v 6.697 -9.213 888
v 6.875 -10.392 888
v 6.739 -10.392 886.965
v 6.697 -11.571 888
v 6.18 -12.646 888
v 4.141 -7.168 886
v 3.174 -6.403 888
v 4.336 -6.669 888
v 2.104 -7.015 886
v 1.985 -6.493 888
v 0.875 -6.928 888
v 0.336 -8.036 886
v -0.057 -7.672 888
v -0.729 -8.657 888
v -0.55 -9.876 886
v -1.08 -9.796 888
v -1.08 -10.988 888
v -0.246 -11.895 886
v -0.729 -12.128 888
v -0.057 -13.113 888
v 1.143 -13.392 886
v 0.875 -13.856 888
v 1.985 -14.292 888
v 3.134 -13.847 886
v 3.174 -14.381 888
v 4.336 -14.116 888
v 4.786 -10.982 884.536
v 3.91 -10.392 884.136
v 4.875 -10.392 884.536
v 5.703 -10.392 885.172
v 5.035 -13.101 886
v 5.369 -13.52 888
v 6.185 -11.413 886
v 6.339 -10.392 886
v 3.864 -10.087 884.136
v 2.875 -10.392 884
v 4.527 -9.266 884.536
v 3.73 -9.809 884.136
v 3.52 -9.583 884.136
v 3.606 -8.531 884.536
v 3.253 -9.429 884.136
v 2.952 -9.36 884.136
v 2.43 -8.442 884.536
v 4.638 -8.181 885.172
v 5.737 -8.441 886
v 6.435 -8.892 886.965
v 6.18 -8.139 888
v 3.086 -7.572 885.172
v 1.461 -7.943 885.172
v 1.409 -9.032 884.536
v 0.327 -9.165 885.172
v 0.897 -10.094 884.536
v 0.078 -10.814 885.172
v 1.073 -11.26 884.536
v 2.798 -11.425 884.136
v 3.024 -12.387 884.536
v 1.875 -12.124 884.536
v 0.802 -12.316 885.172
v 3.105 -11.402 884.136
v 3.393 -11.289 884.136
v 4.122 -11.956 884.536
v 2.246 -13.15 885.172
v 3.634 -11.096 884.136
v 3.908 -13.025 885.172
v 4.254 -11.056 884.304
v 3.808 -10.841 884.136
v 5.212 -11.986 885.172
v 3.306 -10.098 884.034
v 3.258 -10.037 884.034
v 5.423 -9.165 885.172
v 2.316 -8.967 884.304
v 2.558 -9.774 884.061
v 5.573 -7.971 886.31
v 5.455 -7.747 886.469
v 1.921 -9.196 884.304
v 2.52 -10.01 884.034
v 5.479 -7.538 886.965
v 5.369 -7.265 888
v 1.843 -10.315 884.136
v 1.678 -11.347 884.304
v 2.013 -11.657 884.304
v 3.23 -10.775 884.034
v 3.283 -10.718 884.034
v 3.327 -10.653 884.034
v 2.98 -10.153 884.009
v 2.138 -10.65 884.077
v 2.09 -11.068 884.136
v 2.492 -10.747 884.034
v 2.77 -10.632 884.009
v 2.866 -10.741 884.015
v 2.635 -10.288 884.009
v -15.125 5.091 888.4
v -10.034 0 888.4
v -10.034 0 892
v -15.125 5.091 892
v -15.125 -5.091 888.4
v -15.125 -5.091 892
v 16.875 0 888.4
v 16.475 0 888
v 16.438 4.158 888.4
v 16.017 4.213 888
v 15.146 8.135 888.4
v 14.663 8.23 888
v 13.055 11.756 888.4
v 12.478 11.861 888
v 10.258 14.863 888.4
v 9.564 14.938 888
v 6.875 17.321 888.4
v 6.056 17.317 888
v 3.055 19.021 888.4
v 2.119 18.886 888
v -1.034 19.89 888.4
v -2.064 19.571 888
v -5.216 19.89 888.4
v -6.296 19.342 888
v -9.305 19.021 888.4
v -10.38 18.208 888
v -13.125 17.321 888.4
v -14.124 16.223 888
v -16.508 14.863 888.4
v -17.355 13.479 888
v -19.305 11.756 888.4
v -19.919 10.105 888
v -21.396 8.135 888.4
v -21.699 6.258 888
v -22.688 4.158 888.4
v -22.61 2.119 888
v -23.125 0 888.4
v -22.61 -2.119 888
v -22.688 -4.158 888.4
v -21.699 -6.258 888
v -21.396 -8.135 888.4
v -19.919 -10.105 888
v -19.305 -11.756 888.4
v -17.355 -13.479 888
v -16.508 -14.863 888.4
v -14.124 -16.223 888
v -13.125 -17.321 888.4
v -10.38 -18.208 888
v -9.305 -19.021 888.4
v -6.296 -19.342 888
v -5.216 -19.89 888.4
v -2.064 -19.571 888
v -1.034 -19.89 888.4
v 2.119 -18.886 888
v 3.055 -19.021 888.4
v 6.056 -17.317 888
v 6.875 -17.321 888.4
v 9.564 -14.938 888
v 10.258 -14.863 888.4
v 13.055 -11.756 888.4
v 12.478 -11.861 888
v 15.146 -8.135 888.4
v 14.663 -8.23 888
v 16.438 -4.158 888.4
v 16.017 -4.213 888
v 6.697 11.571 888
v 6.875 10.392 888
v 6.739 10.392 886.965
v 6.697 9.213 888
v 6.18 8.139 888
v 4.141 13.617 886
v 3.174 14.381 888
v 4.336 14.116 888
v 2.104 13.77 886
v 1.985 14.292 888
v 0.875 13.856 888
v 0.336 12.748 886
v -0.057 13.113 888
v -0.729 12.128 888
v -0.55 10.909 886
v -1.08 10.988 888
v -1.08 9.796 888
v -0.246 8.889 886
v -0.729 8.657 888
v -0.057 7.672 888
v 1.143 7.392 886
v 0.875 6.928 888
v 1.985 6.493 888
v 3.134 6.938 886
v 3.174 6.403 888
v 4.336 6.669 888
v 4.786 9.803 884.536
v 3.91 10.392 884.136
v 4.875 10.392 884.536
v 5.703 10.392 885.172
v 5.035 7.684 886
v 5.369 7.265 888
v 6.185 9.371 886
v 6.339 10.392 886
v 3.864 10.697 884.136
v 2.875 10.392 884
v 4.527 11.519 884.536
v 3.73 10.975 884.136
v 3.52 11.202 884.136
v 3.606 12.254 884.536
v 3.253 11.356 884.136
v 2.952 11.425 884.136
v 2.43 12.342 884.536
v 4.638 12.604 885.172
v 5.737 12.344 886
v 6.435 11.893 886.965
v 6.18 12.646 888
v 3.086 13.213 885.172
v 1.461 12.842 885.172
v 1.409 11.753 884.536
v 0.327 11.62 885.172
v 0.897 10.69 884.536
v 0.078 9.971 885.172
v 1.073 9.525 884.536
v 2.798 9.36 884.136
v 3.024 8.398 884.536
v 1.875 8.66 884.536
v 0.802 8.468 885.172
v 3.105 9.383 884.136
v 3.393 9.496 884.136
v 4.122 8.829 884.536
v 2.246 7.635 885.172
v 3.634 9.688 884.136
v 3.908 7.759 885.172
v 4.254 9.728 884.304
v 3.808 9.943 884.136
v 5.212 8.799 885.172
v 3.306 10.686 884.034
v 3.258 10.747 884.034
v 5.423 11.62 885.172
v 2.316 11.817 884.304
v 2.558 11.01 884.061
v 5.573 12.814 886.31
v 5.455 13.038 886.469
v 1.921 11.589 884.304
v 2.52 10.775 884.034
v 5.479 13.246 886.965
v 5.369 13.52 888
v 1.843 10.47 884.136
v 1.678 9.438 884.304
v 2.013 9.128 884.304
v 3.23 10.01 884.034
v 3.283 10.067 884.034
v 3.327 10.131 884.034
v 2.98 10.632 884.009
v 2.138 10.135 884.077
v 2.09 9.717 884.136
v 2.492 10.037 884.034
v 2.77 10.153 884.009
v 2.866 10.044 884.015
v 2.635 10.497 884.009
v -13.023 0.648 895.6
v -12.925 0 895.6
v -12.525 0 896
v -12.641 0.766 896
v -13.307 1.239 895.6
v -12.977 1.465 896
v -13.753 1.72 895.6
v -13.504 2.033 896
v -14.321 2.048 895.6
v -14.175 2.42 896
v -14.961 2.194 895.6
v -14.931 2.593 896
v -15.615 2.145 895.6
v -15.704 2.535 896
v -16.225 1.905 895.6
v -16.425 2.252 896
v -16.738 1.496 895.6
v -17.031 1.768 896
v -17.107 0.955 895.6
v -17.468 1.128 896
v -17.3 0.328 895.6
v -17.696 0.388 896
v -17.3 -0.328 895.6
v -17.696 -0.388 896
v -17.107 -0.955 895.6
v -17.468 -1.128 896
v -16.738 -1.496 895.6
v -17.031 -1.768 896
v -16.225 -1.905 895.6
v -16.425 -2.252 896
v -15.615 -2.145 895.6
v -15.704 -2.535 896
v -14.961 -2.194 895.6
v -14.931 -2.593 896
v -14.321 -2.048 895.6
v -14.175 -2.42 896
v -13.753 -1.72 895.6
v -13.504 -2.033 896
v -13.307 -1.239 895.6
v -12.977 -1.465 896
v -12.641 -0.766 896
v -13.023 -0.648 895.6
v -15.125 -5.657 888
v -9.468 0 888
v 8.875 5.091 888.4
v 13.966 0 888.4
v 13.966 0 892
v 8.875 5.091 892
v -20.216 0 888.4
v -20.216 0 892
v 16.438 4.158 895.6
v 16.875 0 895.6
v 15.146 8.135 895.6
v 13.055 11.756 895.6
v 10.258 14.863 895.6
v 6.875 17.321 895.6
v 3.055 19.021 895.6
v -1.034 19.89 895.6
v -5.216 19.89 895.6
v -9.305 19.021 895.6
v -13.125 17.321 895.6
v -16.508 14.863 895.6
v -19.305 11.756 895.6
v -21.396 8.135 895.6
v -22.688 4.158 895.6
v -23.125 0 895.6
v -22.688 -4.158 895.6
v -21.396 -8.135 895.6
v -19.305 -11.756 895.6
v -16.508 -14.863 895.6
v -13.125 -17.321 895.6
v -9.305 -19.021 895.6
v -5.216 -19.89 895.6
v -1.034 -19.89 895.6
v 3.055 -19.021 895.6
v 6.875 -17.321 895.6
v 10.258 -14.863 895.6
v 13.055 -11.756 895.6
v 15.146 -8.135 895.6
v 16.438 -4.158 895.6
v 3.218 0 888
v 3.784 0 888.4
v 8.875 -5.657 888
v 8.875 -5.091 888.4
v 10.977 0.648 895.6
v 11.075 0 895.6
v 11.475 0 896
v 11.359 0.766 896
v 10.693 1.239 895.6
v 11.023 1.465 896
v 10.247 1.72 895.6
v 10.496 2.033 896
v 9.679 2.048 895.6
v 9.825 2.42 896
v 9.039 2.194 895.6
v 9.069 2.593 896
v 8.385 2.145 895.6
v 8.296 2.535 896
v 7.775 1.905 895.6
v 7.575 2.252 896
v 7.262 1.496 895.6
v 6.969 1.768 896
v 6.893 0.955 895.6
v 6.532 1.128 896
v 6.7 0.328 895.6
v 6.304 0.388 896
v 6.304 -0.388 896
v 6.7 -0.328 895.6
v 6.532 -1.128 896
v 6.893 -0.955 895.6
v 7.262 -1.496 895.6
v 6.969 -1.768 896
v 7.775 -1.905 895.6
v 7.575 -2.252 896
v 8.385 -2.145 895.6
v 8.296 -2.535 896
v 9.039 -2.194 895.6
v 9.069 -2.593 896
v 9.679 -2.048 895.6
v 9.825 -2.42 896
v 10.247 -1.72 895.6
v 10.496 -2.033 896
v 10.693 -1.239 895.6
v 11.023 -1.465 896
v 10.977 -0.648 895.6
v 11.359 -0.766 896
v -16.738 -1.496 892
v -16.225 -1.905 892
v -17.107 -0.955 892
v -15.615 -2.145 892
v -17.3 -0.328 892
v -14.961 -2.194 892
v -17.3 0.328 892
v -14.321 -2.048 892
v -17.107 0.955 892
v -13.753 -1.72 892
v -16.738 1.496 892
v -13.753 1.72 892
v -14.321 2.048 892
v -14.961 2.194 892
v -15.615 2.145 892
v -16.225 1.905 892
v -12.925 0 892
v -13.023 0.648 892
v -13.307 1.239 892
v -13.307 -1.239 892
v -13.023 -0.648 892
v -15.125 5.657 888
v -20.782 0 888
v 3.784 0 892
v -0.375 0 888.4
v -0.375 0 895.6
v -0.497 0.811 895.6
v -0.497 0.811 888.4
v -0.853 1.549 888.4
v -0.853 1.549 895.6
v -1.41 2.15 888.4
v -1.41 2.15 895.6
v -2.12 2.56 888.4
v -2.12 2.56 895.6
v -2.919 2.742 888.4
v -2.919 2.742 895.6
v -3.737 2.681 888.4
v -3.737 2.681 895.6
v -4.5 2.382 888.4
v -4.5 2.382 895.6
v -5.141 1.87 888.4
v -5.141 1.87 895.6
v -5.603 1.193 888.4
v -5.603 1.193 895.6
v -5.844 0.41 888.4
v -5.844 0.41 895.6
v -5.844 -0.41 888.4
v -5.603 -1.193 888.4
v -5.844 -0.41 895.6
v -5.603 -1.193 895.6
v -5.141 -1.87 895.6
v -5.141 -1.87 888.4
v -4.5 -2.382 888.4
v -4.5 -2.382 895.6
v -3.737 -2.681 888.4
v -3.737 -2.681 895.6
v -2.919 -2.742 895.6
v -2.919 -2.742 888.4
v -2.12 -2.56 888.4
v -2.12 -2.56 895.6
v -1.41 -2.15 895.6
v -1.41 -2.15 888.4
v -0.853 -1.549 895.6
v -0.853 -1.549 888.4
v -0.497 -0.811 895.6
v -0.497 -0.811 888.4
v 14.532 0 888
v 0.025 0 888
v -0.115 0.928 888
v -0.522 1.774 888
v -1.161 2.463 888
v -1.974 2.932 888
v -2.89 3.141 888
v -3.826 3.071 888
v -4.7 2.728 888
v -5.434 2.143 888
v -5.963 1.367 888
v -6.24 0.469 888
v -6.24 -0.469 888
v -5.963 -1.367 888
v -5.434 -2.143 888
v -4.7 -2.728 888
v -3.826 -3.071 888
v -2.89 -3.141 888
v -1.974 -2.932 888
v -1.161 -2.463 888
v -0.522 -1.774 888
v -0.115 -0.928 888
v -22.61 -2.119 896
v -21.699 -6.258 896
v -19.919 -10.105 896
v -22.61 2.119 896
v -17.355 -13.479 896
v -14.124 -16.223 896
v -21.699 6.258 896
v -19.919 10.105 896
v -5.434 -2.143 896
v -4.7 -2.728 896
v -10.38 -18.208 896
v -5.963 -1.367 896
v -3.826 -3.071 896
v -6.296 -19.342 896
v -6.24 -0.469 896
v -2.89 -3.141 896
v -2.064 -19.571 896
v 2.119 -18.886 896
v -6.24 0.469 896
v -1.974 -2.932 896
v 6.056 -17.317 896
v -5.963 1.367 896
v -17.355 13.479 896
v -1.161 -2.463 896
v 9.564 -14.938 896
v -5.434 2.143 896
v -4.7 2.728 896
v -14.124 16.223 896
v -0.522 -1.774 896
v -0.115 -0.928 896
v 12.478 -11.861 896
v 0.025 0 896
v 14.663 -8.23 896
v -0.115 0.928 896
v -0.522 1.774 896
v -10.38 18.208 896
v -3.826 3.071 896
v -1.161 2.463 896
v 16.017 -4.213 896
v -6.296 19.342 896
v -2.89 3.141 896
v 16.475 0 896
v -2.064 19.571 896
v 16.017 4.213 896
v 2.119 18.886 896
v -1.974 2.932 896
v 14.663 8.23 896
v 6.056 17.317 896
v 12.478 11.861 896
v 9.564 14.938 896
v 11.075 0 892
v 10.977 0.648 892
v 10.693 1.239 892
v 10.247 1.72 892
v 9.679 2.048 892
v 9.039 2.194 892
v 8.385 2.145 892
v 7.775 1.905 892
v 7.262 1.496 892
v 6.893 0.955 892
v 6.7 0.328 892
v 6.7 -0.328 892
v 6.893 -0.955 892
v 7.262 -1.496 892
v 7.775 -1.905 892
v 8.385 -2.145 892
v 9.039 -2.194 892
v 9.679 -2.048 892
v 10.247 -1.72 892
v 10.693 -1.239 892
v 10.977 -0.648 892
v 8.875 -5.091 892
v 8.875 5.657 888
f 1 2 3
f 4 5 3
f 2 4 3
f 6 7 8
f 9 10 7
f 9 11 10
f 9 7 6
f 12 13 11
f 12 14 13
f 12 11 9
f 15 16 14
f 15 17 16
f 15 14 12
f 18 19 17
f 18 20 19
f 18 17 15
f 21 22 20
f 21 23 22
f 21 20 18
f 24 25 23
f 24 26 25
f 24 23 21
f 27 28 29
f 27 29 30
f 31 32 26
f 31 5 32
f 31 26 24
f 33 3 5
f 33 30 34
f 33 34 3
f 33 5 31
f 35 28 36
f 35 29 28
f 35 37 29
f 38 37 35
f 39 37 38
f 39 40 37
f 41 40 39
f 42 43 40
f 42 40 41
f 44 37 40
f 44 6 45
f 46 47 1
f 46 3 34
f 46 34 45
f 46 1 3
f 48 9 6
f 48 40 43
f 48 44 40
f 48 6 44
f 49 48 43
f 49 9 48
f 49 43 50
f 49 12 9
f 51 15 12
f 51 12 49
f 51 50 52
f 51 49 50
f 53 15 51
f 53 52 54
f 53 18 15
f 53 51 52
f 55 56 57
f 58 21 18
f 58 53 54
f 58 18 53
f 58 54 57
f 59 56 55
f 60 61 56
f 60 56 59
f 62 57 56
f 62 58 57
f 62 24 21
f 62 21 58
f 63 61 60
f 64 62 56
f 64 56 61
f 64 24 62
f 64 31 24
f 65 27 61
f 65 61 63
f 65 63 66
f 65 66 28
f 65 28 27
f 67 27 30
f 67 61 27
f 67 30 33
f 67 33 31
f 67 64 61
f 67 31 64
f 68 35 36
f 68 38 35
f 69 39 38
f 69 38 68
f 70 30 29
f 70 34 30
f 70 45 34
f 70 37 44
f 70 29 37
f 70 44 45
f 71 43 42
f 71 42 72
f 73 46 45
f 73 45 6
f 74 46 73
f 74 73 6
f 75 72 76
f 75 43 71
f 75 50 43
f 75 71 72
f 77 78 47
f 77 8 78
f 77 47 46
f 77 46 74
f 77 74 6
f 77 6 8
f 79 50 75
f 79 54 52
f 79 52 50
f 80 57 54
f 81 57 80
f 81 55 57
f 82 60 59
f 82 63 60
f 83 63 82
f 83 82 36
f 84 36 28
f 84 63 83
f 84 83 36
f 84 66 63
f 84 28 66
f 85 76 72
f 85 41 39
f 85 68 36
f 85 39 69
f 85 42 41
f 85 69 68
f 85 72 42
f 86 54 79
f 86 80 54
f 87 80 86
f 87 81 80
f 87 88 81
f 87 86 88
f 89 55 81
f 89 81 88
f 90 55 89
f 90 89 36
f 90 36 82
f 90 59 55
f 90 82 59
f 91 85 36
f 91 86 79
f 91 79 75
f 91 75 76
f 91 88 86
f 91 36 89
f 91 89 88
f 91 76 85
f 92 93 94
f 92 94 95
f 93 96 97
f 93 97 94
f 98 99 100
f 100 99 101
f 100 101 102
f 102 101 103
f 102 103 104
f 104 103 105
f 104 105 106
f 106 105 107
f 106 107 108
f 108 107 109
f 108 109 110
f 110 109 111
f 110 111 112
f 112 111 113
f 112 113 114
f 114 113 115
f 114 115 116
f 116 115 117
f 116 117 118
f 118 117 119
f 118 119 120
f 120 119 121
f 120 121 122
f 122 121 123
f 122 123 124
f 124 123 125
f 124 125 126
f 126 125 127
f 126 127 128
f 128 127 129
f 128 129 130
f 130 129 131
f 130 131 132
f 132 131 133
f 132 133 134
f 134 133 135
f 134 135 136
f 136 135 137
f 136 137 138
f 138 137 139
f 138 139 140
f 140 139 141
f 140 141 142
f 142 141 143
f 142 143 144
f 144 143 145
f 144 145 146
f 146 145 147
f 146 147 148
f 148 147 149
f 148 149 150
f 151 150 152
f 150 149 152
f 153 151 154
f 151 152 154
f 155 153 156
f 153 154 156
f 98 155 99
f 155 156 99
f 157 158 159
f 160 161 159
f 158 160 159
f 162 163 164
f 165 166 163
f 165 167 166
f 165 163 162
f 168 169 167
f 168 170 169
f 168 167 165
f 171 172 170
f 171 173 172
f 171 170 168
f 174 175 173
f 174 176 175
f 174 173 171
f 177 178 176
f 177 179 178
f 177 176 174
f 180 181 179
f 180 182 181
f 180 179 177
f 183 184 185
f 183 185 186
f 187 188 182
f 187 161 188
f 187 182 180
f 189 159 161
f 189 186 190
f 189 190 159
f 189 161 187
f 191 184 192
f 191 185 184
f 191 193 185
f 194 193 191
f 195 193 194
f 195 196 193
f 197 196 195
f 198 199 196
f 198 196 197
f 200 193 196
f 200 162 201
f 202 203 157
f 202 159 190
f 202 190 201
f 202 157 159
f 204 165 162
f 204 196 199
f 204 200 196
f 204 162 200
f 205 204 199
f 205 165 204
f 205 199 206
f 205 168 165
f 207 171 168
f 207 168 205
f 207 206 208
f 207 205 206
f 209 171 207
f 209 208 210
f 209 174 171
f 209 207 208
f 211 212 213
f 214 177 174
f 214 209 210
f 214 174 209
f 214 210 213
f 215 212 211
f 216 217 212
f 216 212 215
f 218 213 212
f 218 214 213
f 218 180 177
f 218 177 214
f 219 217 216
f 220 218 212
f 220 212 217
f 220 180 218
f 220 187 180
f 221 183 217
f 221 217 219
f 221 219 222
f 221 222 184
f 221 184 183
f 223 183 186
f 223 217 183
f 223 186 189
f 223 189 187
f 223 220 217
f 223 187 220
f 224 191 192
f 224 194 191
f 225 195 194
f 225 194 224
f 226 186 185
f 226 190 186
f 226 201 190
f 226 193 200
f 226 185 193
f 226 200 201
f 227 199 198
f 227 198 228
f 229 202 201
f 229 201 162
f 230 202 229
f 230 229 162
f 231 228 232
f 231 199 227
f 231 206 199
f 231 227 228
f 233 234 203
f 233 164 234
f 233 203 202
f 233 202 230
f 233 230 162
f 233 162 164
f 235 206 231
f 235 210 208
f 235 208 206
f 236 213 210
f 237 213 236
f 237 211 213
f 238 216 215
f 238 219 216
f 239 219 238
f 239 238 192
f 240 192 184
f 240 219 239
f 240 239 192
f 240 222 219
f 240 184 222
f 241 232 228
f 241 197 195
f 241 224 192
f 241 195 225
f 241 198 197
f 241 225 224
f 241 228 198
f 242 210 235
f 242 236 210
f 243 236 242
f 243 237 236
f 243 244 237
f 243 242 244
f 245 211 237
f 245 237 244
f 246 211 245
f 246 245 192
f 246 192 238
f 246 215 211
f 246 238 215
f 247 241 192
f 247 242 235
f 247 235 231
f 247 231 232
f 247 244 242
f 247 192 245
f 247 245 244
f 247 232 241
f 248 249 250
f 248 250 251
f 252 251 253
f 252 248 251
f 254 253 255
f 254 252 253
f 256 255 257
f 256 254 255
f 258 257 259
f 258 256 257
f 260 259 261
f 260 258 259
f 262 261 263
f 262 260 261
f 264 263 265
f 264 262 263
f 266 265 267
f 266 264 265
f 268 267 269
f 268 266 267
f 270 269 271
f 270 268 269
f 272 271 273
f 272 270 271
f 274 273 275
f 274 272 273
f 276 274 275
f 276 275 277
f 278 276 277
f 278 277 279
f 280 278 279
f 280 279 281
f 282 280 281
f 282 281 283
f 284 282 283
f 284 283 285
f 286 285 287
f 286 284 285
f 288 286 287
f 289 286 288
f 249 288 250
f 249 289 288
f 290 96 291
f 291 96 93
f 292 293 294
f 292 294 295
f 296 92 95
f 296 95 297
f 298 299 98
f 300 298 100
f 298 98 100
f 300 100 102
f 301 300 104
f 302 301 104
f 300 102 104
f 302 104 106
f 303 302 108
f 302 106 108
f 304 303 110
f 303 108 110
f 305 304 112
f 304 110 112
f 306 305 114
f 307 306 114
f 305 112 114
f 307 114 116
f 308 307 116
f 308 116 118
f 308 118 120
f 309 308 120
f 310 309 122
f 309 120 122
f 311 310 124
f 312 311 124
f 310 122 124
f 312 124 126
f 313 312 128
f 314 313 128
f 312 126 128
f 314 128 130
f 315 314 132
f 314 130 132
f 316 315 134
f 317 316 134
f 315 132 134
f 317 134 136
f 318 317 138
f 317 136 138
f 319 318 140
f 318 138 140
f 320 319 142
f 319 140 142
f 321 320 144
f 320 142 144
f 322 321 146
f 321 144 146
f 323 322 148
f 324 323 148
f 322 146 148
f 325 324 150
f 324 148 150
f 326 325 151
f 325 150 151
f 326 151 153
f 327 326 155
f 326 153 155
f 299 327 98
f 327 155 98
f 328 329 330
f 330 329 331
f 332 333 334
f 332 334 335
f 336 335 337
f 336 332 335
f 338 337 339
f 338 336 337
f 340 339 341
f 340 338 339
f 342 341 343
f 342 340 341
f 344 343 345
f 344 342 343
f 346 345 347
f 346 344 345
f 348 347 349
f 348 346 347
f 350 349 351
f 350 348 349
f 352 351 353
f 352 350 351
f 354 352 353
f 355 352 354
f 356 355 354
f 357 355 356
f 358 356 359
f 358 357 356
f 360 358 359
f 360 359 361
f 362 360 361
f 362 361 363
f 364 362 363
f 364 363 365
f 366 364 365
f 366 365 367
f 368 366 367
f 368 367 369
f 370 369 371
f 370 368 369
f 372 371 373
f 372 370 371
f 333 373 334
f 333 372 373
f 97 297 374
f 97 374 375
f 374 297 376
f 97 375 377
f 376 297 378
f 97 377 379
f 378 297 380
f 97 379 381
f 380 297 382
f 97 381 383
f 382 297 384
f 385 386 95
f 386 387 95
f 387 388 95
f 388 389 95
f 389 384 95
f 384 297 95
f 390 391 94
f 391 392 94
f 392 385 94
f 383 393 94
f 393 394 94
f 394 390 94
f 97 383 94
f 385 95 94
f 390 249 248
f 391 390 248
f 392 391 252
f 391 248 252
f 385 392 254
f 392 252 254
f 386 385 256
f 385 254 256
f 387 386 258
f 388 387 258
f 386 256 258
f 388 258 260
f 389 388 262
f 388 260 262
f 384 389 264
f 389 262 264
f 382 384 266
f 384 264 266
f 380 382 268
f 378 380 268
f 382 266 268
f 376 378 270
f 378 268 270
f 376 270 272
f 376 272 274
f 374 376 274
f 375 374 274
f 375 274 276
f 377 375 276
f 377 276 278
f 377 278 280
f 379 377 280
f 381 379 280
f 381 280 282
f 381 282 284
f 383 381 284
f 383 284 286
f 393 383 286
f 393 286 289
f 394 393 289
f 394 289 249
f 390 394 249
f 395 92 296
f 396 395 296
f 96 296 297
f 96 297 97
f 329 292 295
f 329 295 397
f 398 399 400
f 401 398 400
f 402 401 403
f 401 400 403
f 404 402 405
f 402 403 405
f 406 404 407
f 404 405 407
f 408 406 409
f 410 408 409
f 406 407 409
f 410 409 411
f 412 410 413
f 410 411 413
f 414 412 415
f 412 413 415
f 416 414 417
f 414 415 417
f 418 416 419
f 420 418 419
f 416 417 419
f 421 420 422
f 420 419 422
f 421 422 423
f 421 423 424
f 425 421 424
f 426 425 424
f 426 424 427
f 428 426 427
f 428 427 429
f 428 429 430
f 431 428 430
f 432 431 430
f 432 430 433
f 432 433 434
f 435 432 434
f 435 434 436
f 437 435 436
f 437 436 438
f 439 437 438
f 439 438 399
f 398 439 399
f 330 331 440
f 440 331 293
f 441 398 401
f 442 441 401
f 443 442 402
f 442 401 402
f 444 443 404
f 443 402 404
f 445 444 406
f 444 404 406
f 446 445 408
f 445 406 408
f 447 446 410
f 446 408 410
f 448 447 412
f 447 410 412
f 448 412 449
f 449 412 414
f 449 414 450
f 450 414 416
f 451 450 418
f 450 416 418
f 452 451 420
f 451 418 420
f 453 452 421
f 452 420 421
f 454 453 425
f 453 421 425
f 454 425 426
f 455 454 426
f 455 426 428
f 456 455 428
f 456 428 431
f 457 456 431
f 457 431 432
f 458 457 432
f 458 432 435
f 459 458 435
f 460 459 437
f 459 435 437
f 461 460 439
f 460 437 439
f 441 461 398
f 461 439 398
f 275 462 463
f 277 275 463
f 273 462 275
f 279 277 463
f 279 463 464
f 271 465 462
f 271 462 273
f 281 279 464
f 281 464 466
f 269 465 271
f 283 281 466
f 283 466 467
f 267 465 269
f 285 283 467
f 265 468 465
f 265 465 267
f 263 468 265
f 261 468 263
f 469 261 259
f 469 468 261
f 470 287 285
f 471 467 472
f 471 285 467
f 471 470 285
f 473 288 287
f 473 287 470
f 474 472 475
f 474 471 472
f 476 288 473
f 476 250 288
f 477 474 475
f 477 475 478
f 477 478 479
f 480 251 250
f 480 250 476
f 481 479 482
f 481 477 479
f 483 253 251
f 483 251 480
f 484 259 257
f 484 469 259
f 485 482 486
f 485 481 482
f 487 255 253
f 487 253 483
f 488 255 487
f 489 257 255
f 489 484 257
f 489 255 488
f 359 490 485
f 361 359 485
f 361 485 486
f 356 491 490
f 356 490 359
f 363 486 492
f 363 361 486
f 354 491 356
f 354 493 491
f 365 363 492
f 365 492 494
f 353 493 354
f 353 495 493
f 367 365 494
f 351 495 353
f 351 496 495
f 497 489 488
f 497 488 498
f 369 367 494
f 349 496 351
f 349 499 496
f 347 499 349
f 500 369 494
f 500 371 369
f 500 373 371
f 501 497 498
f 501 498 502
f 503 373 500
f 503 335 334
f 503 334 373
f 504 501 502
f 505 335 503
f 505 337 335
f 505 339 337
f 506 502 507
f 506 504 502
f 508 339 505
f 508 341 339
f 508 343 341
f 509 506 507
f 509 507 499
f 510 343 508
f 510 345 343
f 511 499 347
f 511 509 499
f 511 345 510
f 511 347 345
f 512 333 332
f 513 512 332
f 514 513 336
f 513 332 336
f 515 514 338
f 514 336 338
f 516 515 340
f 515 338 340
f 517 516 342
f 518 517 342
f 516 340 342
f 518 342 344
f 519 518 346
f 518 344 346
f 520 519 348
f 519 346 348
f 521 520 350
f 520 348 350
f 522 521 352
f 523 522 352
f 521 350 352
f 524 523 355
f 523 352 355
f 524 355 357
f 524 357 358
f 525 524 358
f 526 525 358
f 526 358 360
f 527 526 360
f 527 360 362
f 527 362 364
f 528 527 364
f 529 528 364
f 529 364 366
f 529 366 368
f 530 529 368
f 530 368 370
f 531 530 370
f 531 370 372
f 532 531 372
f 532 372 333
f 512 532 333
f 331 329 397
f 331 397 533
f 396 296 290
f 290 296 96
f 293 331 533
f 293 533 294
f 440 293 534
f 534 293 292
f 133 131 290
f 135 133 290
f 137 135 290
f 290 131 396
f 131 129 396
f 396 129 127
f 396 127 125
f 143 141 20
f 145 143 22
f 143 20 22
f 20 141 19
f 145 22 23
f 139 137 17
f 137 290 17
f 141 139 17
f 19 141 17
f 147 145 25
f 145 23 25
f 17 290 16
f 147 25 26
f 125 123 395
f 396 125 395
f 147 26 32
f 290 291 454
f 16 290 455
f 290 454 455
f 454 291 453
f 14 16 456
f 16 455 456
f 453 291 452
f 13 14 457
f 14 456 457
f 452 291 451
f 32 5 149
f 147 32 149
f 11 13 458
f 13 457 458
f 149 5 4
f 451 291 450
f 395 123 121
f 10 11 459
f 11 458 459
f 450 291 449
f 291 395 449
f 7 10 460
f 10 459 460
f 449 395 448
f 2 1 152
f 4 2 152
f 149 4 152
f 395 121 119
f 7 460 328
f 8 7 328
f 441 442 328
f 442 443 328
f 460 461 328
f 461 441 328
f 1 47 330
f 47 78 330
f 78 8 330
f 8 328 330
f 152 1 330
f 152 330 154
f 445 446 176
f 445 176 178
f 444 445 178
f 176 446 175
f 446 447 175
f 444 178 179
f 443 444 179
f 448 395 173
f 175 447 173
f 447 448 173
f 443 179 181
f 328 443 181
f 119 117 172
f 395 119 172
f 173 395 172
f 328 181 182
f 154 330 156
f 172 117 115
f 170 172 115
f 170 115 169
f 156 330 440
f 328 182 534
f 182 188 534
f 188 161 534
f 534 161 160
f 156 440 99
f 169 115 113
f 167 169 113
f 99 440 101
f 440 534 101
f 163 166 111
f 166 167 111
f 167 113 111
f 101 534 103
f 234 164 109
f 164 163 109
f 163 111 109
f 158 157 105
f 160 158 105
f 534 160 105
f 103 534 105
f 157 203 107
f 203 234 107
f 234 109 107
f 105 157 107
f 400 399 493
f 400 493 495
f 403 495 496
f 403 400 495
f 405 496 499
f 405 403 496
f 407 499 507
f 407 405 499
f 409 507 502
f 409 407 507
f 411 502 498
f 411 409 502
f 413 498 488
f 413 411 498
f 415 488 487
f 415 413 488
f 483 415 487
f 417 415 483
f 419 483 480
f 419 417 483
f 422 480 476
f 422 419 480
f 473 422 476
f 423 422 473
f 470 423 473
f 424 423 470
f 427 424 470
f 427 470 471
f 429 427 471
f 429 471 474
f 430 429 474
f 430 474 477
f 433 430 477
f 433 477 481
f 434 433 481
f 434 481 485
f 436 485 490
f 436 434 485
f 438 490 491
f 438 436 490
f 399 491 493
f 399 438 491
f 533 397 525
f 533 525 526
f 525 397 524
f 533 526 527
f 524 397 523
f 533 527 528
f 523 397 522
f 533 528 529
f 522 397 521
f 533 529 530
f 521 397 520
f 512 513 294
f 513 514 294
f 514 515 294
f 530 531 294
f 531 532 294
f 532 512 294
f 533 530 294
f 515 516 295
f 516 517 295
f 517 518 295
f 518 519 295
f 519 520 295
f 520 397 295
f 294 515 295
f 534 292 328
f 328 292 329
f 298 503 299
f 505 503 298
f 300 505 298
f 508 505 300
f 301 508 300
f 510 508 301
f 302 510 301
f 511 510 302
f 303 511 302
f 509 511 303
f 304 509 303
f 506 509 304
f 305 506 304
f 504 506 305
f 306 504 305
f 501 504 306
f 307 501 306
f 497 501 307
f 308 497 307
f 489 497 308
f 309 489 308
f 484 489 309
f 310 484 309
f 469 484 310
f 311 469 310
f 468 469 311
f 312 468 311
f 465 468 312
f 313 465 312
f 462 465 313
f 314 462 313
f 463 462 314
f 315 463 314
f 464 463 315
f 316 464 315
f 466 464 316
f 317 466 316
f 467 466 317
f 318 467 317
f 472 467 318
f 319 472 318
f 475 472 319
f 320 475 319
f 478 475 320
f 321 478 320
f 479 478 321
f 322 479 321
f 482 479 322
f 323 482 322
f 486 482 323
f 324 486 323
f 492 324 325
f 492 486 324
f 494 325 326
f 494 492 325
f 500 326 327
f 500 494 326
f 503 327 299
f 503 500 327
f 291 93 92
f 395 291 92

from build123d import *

# Parameters (mm, degrees)
CYLINDER005_R     = 20
CYLINDER005_DEPTH = 8
SKETCH006_R       = 2.2
SKETCH006_R_2     = 2.75
POCKET004_DEPTH   = 12.001
POCKET005_DEPTH   = 4
CHAMFER005_SIZE   = 0.4


with BuildPart() as part:
    # Cylinder005 → Cylinder005 (join)
    with BuildSketch(Plane.XY):
        Circle(CYLINDER005_R)
    extrude(amount=CYLINDER005_DEPTH)

    # Sphere → Sphere (revolve)
    with BuildSketch(Plane(origin=(6, 10.392305, 0), x_dir=(1, 0, 0), z_dir=(0, -1, 0))):
        with BuildLine():
            ThreePointArc((0, -4), (2.828427, -2.828427), (4, 0))
            Line((4, 0), (0, 0))
            Line((0, 0), (0, -4))
        make_face()
    revolve(axis=Axis((6, 10.392305, 0), (0, 0, 1)))

    # Sphere001 → Sphere001 (revolve)
    with BuildSketch(Plane(origin=(6, -10.392305, 0), x_dir=(1, 0, 0), z_dir=(0, -1, 0))):
        with BuildLine():
            ThreePointArc((0, -4), (2.828427, -2.828427), (4, 0))
            Line((4, 0), (0, 0))
            Line((0, 0), (0, -4))
        make_face()
    revolve(axis=Axis((6, -10.392305, 0), (0, 0, 1)))

    # Sketch006 (on DatumPlane) → Pocket004 (cut, through all)
    with BuildSketch(Plane.XY.offset(8)):
        with Locations((-12, 0)):
            Circle(SKETCH006_R)
        with Locations((12, 0)):
            Circle(SKETCH006_R)
        Circle(SKETCH006_R_2)
    extrude(amount=-POCKET004_DEPTH, mode=Mode.SUBTRACT)

    # Sketch063 (on DatumPlane) → Pocket005 (cut)
    with BuildSketch(Plane.XY):
        Polygon((-17.091169, 0), (-12, -5.091169), (-6.908831, 0), (-12, 5.091169), align=None)
        Polygon((17.091169, 0), (12, 5.091169), (6.908831, 0), (12, -5.091169), align=None)
    extrude(amount=POCKET005_DEPTH, mode=Mode.SUBTRACT)

    # Chamfer005
    chamfer005_edges = [part.edges().sort_by_distance(p)[0] for p in [
        (-20, 0, 8),
        (-14.2, 0, 8),
        (-2.75, 0, 8),
        (9.8, 0, 8),
        (-20, 0, 0),
        (-2.75, 0, 0),
        (9.454416, 2.545584, 0),
        (9.454416, -2.545584, 0),
        (14.545584, -2.545584, 0),
        (14.545584, 2.545584, 0),
        (-9.454416, 2.545584, 0),
        (-14.545584, 2.545584, 0),
        (-14.545584, -2.545584, 0),
        (-9.454416, -2.545584, 0),
    ]]
    chamfer(chamfer005_edges, length=CHAMFER005_SIZE)


with BuildPart() as part_1:
    # Body022003 placement: moved
    add(part.part.moved(Location((-3.125, 0, 888))))


solid = part_1.part
